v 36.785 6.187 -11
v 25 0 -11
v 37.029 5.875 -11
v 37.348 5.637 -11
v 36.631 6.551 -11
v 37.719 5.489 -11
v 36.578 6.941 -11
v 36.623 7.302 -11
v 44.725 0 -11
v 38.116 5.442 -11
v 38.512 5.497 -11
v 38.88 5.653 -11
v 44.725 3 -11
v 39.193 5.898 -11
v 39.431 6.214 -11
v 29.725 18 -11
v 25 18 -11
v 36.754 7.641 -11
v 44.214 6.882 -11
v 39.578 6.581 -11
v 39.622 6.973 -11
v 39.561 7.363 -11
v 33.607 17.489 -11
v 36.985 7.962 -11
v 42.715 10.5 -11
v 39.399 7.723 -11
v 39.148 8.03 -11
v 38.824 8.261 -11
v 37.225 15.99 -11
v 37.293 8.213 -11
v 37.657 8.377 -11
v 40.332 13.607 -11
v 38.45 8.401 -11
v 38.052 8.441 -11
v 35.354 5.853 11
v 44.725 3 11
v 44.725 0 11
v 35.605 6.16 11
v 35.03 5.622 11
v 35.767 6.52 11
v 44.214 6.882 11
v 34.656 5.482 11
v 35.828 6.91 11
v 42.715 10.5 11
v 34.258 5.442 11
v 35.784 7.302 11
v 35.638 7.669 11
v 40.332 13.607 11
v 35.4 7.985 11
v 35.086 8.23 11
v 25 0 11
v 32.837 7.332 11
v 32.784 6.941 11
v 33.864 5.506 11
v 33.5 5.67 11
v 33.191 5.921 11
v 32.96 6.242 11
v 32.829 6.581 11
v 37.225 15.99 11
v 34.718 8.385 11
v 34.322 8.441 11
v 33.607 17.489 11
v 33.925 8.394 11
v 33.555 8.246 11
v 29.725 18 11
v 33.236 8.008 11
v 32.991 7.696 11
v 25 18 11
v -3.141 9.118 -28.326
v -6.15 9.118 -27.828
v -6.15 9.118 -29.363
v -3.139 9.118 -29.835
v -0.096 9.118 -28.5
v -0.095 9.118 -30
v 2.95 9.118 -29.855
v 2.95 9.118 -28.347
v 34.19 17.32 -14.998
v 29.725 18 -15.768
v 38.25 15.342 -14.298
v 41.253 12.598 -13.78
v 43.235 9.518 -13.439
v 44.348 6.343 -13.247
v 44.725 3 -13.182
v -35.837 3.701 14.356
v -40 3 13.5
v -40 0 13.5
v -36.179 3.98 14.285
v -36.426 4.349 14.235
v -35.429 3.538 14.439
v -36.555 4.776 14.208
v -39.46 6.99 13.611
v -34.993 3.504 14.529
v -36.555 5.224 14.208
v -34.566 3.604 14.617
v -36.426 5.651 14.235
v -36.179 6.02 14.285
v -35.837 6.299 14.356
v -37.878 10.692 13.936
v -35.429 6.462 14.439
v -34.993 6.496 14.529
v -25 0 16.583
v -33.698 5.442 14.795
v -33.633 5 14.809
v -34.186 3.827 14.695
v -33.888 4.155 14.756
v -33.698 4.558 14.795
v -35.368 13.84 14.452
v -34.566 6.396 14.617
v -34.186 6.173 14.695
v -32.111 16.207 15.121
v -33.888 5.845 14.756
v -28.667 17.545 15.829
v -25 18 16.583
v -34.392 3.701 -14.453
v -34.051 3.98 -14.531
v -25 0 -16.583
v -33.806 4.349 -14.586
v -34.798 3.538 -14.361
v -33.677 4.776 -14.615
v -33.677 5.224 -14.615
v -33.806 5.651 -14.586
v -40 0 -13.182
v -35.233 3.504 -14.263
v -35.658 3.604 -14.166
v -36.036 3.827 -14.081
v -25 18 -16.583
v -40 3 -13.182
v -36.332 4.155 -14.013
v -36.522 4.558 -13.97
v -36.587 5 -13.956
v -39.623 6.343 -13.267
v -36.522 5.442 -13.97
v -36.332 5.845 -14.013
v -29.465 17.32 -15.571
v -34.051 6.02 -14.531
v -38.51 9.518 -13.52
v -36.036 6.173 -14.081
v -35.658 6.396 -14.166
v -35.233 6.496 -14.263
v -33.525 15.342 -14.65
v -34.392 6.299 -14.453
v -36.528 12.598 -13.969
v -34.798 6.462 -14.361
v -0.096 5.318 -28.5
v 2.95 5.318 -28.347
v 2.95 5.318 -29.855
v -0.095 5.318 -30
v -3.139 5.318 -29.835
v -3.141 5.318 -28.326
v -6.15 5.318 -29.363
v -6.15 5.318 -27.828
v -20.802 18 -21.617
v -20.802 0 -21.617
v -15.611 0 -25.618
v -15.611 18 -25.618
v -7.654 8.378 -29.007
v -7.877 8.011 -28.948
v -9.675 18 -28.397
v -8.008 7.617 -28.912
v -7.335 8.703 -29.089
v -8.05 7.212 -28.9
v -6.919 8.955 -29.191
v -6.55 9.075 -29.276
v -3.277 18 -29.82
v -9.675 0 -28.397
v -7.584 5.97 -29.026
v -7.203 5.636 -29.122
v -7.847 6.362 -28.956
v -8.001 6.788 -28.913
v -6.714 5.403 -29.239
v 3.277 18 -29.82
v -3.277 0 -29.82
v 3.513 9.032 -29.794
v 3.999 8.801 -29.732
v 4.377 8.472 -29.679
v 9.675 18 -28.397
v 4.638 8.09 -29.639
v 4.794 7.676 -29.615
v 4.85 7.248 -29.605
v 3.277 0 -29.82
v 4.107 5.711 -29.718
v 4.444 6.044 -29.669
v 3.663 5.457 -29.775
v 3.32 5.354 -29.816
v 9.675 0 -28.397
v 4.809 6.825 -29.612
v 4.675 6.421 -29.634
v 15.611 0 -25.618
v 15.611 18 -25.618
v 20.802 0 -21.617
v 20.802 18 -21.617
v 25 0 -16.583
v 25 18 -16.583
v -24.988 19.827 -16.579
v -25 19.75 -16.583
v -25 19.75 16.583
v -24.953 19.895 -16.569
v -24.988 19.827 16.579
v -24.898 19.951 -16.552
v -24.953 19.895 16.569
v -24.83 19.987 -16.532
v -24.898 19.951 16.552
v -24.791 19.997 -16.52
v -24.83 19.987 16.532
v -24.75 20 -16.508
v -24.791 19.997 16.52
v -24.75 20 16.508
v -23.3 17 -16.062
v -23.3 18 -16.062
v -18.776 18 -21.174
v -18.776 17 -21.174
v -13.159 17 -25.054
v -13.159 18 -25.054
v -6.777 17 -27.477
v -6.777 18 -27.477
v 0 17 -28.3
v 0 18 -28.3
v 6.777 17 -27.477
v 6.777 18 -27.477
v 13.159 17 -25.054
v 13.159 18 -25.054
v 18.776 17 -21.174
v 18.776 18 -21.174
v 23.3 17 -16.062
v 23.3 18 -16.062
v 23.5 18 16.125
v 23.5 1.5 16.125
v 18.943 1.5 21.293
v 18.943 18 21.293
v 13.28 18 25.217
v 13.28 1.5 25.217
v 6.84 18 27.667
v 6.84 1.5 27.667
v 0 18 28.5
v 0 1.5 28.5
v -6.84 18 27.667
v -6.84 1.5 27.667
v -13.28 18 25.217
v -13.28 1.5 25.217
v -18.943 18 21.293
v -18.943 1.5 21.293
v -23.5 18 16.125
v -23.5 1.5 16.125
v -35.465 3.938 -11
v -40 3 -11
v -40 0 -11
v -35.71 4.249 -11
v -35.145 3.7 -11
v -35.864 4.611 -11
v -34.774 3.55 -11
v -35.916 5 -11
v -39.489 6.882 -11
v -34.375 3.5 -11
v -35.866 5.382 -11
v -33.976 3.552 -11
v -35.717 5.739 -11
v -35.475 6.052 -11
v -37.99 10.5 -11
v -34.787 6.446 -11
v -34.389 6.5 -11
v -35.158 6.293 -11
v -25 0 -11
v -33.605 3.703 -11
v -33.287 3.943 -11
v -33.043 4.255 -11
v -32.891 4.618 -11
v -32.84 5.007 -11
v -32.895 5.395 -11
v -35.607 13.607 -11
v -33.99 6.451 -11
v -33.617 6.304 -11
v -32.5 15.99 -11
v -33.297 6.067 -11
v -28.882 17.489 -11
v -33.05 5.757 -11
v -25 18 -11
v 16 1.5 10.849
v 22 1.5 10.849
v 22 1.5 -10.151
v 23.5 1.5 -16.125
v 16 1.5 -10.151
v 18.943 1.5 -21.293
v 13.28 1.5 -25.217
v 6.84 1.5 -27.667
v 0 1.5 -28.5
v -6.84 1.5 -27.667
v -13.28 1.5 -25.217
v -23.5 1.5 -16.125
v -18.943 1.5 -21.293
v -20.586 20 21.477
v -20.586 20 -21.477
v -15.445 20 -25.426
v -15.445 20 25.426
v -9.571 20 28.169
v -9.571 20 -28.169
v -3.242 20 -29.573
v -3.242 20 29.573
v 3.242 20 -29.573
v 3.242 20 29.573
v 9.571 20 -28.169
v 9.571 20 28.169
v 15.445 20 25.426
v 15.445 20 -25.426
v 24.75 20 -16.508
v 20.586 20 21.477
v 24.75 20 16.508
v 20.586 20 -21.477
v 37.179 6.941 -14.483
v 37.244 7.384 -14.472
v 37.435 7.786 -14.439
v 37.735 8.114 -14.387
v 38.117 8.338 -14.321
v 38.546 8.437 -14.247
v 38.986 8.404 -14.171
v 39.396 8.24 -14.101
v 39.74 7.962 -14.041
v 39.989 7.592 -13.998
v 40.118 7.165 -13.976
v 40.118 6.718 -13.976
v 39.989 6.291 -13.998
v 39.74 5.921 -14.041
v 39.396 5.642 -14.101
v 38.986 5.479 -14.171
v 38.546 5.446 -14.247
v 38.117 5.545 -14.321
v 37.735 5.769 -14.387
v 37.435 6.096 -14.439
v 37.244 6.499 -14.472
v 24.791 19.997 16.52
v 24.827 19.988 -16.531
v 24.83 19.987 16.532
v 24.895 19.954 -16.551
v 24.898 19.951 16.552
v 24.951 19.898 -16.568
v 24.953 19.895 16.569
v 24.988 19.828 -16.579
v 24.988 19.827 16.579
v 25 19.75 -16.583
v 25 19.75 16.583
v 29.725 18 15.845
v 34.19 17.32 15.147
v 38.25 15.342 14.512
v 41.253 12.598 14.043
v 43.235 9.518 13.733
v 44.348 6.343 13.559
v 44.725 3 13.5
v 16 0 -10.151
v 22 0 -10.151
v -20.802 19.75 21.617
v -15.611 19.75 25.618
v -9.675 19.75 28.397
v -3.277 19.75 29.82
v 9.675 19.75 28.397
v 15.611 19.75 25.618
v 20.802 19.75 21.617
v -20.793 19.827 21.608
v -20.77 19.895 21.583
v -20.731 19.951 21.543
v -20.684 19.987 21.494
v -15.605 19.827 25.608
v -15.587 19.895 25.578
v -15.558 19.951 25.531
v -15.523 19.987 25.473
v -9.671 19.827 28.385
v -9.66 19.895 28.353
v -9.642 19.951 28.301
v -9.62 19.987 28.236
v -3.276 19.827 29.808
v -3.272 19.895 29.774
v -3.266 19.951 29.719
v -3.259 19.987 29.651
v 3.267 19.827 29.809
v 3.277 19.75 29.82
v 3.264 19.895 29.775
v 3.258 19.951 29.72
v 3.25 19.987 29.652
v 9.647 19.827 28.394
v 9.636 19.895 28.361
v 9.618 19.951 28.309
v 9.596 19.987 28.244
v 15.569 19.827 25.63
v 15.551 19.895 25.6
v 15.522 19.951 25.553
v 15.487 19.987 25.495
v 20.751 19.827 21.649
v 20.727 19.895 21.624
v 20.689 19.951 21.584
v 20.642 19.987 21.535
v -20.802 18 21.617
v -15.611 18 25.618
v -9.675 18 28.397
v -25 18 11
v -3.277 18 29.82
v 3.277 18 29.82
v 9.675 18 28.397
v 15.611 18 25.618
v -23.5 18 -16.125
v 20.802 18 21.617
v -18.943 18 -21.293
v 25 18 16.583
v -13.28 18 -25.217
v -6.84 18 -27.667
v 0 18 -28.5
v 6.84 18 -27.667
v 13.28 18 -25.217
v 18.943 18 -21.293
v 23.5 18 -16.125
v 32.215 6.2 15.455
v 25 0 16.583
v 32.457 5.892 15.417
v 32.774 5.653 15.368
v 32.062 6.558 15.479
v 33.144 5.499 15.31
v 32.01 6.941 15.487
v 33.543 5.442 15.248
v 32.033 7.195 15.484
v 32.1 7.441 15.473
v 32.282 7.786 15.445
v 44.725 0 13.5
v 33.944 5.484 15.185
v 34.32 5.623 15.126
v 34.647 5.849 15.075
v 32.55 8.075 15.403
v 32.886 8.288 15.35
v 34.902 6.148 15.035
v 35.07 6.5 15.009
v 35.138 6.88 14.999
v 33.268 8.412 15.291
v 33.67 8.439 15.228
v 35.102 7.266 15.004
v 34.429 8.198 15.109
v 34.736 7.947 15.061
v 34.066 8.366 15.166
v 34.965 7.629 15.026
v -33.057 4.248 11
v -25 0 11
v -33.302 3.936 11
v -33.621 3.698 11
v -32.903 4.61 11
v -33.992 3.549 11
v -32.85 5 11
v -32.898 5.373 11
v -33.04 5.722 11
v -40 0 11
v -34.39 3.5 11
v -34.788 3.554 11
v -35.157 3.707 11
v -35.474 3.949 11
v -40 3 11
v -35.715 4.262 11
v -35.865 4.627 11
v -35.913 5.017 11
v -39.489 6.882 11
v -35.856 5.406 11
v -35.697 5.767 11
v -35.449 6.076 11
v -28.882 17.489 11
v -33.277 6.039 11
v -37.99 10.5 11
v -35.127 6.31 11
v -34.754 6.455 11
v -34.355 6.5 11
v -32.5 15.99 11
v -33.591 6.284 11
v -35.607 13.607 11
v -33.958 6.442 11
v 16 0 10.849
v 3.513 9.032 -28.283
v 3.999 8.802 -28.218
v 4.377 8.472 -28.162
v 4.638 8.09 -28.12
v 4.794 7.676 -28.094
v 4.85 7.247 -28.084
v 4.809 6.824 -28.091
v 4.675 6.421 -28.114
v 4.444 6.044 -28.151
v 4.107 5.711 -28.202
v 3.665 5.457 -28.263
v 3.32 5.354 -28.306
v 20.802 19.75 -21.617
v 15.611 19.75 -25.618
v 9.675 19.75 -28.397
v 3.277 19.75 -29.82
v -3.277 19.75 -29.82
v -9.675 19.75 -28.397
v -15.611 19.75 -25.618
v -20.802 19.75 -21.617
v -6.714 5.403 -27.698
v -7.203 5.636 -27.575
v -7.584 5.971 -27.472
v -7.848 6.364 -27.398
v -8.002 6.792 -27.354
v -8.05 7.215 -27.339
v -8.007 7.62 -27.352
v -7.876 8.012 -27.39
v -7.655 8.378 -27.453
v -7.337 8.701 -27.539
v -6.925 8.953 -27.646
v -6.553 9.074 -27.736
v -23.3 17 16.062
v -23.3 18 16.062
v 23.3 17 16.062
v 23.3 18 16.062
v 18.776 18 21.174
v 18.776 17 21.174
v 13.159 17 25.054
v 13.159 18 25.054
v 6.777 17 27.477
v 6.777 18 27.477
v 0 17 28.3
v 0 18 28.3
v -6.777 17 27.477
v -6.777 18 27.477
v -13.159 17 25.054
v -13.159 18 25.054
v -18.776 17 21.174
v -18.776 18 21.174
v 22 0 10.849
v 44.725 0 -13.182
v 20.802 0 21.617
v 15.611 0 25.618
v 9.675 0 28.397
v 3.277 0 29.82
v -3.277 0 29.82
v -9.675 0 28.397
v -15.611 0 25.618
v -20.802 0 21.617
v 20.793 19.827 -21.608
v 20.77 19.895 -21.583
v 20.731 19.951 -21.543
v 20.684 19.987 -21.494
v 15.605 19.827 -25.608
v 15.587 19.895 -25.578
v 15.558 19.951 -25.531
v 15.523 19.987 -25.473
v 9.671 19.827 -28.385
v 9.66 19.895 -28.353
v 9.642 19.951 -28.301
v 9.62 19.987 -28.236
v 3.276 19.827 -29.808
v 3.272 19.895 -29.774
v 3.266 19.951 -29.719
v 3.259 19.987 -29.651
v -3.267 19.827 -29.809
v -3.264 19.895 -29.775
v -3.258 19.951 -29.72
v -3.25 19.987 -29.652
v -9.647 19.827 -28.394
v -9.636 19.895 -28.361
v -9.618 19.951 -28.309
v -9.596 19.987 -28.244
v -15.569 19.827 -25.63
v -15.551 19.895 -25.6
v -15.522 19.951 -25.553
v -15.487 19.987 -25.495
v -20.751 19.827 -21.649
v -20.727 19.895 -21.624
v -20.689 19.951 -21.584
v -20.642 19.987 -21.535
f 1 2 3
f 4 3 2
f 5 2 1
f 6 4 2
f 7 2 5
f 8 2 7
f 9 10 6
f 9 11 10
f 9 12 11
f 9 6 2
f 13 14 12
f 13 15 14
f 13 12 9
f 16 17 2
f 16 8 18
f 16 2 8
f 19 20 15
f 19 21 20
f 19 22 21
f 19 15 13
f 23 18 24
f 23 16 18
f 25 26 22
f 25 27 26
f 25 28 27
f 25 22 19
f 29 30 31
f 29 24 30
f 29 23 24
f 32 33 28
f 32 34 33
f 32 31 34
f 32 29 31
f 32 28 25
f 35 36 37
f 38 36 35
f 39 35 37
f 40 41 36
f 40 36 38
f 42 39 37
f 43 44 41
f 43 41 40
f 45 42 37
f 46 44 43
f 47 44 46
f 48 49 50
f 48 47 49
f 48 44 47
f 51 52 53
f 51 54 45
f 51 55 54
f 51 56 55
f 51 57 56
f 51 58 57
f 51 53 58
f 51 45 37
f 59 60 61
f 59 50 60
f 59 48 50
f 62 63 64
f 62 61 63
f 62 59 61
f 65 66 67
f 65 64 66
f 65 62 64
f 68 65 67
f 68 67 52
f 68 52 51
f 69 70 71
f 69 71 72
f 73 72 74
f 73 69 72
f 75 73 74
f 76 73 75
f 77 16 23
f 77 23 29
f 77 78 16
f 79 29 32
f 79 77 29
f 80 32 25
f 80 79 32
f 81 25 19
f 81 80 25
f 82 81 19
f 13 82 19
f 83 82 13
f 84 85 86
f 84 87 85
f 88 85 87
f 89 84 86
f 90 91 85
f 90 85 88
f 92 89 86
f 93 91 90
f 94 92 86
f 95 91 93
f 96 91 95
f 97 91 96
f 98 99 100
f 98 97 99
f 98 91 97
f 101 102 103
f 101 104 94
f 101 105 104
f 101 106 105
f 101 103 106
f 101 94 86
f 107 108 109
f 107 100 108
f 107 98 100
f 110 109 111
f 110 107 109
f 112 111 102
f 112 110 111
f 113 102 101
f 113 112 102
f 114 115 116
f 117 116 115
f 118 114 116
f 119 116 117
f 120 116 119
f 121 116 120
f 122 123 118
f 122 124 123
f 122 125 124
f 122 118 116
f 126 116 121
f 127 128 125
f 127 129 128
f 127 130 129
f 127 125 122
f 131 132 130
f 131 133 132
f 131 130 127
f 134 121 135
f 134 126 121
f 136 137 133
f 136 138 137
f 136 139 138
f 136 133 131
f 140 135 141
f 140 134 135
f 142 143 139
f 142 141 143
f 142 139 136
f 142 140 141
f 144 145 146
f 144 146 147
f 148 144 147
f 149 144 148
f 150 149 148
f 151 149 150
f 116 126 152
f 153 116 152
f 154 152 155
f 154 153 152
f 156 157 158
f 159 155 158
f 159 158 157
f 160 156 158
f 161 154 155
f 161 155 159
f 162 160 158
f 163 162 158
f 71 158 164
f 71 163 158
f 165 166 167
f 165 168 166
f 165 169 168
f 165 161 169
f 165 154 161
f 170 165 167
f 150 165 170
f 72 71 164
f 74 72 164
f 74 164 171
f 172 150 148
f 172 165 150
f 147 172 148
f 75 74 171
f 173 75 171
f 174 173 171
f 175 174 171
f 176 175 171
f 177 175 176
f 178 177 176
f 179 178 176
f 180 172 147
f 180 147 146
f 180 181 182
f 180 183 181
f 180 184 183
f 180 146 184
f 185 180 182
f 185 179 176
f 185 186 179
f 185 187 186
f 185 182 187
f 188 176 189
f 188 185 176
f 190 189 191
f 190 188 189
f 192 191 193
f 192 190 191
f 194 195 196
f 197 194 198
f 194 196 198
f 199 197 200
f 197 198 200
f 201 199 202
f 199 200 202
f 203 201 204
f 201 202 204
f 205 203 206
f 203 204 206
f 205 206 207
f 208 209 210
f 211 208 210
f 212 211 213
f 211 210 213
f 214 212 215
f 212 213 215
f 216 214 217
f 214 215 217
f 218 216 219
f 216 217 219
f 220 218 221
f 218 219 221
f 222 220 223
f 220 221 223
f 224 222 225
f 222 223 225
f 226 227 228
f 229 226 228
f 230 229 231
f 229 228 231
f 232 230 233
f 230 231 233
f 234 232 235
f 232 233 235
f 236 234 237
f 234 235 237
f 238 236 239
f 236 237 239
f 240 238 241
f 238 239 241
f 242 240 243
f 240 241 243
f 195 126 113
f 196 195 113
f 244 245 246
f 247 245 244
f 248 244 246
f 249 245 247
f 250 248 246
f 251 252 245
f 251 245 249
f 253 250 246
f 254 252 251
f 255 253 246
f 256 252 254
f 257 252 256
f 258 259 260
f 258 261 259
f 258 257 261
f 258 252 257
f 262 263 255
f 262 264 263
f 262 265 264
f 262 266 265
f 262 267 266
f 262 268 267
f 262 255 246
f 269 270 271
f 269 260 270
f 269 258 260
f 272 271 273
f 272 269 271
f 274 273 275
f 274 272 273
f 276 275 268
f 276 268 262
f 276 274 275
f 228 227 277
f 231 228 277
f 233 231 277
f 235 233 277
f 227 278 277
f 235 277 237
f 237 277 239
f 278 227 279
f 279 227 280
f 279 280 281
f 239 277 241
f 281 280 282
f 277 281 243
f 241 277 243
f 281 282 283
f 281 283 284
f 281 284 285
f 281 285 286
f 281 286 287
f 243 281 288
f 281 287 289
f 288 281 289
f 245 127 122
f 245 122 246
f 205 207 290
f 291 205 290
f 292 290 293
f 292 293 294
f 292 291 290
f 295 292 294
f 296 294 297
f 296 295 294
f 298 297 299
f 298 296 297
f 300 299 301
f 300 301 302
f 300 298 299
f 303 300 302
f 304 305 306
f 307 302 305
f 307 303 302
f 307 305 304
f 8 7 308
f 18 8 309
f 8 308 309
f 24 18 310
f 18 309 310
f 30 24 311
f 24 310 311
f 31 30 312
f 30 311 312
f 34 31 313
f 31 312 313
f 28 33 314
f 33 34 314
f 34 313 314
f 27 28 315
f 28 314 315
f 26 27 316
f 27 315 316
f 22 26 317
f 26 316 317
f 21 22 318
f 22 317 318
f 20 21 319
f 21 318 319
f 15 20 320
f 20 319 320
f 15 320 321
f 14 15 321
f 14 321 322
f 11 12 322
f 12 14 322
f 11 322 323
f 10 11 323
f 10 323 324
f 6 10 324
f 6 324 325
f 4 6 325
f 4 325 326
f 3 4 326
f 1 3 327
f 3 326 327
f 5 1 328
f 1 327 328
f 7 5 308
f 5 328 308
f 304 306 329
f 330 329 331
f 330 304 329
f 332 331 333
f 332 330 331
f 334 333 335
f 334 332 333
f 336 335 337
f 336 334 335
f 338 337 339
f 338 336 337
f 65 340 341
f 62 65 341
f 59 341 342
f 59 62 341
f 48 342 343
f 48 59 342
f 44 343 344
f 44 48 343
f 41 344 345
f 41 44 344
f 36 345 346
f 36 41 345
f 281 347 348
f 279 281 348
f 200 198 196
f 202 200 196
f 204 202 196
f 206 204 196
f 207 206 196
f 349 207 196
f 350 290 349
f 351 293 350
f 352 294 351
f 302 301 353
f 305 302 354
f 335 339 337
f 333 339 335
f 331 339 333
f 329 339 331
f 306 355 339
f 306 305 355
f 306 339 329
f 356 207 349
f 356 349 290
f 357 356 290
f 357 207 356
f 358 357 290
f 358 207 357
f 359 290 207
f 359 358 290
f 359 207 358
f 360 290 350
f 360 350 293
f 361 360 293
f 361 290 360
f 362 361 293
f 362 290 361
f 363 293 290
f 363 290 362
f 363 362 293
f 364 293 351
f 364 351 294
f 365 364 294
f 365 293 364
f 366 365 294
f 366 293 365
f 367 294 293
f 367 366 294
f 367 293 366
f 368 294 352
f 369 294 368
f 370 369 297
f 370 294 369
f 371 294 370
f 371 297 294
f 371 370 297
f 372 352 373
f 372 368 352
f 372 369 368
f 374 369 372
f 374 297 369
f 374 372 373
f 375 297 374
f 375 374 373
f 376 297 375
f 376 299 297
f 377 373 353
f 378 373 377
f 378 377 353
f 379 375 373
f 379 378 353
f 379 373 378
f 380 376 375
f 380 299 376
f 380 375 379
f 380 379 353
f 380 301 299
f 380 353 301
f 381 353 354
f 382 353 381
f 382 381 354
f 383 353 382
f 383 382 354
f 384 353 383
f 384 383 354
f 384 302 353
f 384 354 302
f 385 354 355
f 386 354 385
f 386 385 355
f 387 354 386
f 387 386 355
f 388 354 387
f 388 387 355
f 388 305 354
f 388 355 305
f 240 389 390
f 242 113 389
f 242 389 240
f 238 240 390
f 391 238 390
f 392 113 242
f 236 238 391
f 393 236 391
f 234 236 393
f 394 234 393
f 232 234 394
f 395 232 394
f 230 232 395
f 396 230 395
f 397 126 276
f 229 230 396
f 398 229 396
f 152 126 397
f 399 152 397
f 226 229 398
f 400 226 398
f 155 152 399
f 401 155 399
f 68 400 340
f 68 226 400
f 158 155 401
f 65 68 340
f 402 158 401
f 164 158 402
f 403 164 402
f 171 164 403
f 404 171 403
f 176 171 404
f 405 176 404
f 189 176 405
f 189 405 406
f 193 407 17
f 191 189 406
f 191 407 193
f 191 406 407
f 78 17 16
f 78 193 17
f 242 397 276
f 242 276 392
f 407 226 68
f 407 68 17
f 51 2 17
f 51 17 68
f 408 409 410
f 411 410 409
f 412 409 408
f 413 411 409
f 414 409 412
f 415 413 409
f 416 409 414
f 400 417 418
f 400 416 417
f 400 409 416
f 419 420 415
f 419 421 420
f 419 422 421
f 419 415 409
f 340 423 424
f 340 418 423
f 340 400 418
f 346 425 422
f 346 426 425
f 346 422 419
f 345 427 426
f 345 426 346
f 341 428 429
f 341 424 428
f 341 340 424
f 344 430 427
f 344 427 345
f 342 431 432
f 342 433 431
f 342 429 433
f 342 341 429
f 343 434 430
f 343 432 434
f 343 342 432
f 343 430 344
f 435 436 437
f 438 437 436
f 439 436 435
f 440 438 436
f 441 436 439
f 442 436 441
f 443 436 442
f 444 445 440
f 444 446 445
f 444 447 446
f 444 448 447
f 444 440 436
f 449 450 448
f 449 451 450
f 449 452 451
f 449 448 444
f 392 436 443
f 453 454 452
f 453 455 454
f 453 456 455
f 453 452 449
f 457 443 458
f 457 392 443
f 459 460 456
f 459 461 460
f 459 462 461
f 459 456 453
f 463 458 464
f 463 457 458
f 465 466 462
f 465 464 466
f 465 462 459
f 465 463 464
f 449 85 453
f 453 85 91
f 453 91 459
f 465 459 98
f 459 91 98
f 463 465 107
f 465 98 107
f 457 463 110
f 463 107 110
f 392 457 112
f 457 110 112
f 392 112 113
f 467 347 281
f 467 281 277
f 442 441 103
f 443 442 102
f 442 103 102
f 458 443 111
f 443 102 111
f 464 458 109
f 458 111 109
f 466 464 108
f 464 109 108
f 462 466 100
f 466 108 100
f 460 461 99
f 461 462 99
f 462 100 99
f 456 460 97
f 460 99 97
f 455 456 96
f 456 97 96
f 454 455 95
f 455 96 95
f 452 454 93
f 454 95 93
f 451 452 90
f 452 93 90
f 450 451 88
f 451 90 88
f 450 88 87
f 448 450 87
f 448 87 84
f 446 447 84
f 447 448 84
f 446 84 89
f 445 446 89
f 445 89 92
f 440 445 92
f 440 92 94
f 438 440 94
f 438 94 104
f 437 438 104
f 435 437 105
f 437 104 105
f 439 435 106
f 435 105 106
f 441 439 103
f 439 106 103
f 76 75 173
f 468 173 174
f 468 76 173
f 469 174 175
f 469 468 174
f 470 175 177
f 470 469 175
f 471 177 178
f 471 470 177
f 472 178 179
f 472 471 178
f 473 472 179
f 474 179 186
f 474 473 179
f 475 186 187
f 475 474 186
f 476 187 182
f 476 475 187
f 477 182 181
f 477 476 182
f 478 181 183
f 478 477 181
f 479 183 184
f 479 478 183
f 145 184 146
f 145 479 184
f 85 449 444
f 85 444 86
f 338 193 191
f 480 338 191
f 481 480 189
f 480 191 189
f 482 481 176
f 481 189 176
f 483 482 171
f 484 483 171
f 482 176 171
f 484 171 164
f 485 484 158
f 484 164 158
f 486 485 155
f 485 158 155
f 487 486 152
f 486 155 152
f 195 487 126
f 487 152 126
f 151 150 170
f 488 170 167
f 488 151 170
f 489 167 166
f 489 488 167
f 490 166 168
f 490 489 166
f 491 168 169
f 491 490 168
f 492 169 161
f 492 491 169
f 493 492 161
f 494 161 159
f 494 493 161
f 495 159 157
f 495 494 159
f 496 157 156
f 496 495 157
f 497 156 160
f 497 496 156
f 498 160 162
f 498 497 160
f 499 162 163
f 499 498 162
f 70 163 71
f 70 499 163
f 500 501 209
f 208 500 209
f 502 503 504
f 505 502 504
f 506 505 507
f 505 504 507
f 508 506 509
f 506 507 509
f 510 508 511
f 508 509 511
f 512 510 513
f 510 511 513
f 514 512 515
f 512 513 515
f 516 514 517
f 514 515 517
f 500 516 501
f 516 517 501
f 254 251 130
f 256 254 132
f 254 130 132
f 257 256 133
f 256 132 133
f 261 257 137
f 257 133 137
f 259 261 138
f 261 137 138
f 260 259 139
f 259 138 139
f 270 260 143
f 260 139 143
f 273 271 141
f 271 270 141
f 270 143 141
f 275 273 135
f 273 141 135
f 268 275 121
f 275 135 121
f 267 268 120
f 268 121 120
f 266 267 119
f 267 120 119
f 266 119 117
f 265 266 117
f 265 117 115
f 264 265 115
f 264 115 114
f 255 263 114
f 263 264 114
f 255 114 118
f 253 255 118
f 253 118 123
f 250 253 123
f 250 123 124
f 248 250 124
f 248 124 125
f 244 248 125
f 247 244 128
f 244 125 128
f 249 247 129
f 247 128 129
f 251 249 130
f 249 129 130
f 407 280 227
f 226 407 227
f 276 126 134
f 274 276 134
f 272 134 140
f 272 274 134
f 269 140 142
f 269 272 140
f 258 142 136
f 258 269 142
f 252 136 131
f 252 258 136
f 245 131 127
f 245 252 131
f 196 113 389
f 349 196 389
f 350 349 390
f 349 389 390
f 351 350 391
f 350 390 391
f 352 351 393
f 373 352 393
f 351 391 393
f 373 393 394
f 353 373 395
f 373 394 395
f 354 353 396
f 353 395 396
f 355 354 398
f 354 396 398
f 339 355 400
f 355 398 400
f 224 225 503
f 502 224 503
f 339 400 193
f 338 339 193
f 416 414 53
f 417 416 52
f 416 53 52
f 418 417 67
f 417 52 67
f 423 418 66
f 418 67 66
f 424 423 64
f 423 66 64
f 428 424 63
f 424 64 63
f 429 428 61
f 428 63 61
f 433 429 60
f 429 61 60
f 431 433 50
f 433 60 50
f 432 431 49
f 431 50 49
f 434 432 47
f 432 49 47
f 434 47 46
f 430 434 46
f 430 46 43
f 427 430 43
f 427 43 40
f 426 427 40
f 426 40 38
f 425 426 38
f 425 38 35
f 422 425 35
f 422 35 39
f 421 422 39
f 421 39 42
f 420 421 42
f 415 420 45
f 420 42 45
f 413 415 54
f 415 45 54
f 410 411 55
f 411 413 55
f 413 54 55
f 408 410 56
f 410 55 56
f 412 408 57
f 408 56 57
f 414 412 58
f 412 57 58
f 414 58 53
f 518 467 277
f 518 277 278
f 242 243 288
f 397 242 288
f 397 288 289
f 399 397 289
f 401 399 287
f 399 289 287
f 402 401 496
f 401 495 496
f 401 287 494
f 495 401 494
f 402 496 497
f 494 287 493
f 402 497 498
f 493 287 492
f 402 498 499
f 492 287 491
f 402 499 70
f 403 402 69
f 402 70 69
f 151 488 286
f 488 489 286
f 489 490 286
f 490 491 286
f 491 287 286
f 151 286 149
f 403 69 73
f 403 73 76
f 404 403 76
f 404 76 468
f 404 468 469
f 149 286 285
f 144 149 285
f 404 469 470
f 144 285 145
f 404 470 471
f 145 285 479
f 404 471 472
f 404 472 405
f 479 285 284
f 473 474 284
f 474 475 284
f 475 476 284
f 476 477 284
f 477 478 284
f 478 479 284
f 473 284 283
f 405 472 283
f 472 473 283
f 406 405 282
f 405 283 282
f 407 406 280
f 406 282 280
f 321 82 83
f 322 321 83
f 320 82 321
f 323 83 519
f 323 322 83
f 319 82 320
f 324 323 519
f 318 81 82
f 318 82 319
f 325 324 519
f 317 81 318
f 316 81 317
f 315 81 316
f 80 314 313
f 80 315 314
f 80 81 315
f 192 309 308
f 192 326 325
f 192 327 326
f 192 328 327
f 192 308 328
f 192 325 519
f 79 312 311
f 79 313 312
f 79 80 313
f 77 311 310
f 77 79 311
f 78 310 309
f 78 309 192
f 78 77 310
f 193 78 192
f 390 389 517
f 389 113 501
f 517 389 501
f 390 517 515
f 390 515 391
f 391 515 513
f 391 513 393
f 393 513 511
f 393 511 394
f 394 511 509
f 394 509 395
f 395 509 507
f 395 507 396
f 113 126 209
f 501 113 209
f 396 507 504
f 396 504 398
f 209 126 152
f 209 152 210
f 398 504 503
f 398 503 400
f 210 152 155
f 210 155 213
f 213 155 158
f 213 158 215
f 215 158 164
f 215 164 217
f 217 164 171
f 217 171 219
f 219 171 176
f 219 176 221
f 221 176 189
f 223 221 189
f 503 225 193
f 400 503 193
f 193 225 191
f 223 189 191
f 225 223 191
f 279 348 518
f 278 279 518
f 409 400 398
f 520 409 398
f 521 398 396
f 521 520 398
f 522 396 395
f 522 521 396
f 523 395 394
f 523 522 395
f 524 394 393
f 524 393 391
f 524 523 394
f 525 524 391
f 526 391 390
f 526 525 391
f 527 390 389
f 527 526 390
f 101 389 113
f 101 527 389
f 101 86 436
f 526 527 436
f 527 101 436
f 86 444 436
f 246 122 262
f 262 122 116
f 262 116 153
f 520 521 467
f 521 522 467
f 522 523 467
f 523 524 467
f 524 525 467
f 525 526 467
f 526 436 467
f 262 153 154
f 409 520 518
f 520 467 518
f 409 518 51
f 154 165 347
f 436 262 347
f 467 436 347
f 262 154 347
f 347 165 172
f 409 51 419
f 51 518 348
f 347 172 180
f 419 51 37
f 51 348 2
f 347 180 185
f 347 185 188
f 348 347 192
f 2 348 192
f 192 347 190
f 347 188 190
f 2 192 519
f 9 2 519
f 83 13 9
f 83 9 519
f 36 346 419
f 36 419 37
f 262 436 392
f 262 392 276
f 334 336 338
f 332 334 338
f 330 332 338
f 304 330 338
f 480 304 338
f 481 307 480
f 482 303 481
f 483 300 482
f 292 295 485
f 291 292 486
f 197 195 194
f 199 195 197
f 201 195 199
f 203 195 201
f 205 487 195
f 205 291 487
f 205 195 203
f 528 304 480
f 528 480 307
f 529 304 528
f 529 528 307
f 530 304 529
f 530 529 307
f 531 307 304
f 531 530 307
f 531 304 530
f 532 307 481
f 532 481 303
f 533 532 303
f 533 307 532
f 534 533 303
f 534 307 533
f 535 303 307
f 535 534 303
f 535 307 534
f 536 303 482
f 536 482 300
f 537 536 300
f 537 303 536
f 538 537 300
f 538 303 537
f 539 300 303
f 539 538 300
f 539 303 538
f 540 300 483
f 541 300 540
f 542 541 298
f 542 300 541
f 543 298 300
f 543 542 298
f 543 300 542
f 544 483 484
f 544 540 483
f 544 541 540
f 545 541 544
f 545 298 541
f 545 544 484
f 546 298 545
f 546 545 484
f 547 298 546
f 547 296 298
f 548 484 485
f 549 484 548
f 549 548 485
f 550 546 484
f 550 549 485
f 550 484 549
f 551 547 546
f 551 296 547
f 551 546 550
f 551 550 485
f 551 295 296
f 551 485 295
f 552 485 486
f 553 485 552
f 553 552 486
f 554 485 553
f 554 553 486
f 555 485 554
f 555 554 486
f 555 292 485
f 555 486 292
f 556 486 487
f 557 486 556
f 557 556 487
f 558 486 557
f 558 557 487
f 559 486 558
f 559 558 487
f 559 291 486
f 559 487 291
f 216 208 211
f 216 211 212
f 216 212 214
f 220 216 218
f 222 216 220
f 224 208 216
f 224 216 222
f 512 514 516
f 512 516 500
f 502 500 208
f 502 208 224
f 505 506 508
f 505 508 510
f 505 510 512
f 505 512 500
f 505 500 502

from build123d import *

# Parameters (mm, degrees)
BOSS_EXTRUDE2_DEPTH = 18
SHELL1_T            = -1.5
BOSS_EXTRUDE3_DEPTH = 2
BOSS_EXTRUDE4_DEPTH = 1
BOSS_EXTRUDE7_DEPTH = 18
FILLET7_R           = 0.25
CUT_EXTRUDE4_DEPTH  = 58.448499703
SKETCH10_R          = 1.5
CUT_EXTRUDE5_DEPTH  = 70.435814173
SKETCH11_R          = 1.5
CUT_EXTRUDE7_DEPTH  = 10
SKETCH12_R          = 1.5
CUT_EXTRUDE8_DEPTH  = 10
SKETCH13_W          = 6
SKETCH13_H          = 21
CUT_EXTRUDE10_DEPTH = 10
FILLET10_R          = 15


with BuildPart() as part:
    # Sketch1 → Boss-Extrude2 (new body)
    with BuildSketch(Plane(origin=(0, 0, 0), x_dir=(1, 0, 0), z_dir=(0, 1, 0))):
        with BuildLine():
            Line((25, 16.583123952), (25, -16.583123952))
            ThreePointArc((25, -16.583123952), (0, -30), (-25, -16.583123952))
            Line((-25, -16.583123952), (-25, 16.583123952))
            ThreePointArc((-25, 16.583123952), (0, 30), (25, 16.583123952))
        make_face()
    extrude(amount=BOSS_EXTRUDE2_DEPTH)

    # Shell1
    shell1_openings = [part.faces().sort_by_distance(p)[0] for p in [
        (0, 18, 0),
    ]]
    offset(amount=SHELL1_T, openings=shell1_openings, kind=Kind.INTERSECTION)

    # Sketch7 → Boss-Extrude7 (add)
    with BuildSketch(Plane(origin=(0, 18, 0), x_dir=(1, 0, 0), z_dir=(0, 1, 0))):
        Polygon((-40, -13.5), (-25, -16.583123952), (-25, -11), (-40, -11), align=None)
        Polygon((25, -16.583123952), (44.725050119, -13.5), (44.725050119, -11), (25, -11), align=None)
        Polygon((-40, 11), (-25, 11), (-25, 16.583123952), (-40, 13.181667077), align=None)
        Polygon((25, 11), (44.725050119, 11), (44.725050119, 13.181667077), (25, 16.583123952), align=None)
    extrude(amount=-BOSS_EXTRUDE7_DEPTH)

    # Sketch9 → Cut-Extrude4 (cut, through all)
    with BuildSketch(Plane.XY):
        with BuildLine():
            Line((2.949777262, 5.317581021), (-6.150222738, 5.317581021))
            ThreePointArc((-6.150222738, 5.317581021), (-8.050222738, 7.217581021), (-6.150222738, 9.117581021))
            Line((-6.150222738, 9.117581021), (2.949777262, 9.117581021))
            ThreePointArc((2.949777262, 9.117581021), (4.849777262, 7.217581021), (2.949777262, 5.317581021))
        make_face()
    extrude(amount=-CUT_EXTRUDE4_DEPTH, mode=Mode.SUBTRACT)

    # Sketch10 → Cut-Extrude5 (cut, through all)
    with BuildSketch(Plane(origin=(3.49902162, 0, -20.290828129), x_dir=(-0.9854552120358971, 0, -0.16993535556582978), z_dir=(0.1699353555658298, 0, -0.9854552120358973))):
        with Locations((-35.67665006, 6.941451302)):
            Circle(SKETCH10_R)
    extrude(amount=-CUT_EXTRUDE5_DEPTH, mode=Mode.SUBTRACT)

    # Sketch11 → Cut-Extrude7 (cut)
    with BuildSketch(Plane(origin=(-4.799213229, 0, -21.163930954), x_dir=(-0.975240004414675, 0, 0.22114912115869936), z_dir=(-0.22114912115869936, 0, -0.975240004414675))):
        with Locations((31.094486087, 5)):
            Circle(SKETCH11_R)
    extrude(amount=-CUT_EXTRUDE7_DEPTH, mode=Mode.SUBTRACT)

    # Sketch12 → Cut-Extrude8 (cut)
    with BuildSketch(Plane(origin=(-4.283729275, 0, 20.841179316), x_dir=(0.9795229156245254, 0, 0.20133270416509336), z_dir=(-0.20133270416509333, 0, 0.9795229156245253))):
        with Locations((-31.462925119, 5)):
            Circle(SKETCH12_R)
    extrude(amount=-CUT_EXTRUDE8_DEPTH, mode=Mode.SUBTRACT)

    # Sketch13 → Cut-Extrude10 (cut)
    with BuildSketch(Plane.XZ):
        with Locations((19, 0.348849939)):
            Rectangle(SKETCH13_W, SKETCH13_H)
    extrude(amount=-CUT_EXTRUDE10_DEPTH, mode=Mode.SUBTRACT)

    # Fillet10
    fillet10_edges = [part.edges().sort_by_distance(p)[0] for p in [
        (44.725050119, 18, -12.090833539),
        (44.725050119, 18, 12.25),
        (-40, 18, -12.090833539),
        (-40, 18, 12.25),
    ]]
    fillet(fillet10_edges, radius=FILLET10_R)


with BuildPart() as body_2:
    # Sketch2 → Boss-Extrude3 (new body)
    with BuildSketch(Plane(origin=(0, 18, 0), x_dir=(1, 0, 0), z_dir=(0, 1, 0))):
        with BuildLine():
            Line((-25, 16.583123952), (-25, -16.583123952))
            ThreePointArc((-25, -16.583123952), (0, -30), (25, -16.583123952))
            Line((25, -16.583123952), (25, 16.583123952))
            ThreePointArc((25, 16.583123952), (0, 30), (-25, 16.583123952))
        make_face()
    extrude(amount=BOSS_EXTRUDE3_DEPTH)

    # Sketch3 → Boss-Extrude4 (add)
    with BuildSketch(Plane.XZ.offset(-18)):
        with BuildLine():
            Line((23.3, -16.062378404), (23.3, 16.062378404))
            ThreePointArc((23.3, 16.062378404), (0, 28.3), (-23.3, 16.062378404))
            Line((-23.3, 16.062378404), (-23.3, -16.062378404))
            ThreePointArc((-23.3, -16.062378404), (0, -28.3), (23.3, -16.062378404))
        make_face()
    extrude(amount=BOSS_EXTRUDE4_DEPTH)

    # Fillet7
    fillet7_edges = [body_2.edges().sort_by_distance(p)[0] for p in [
        (0, 20, 30),
        (25, 20, 0),
        (0, 20, -30),
        (-25, 20, 0),
    ]]
    fillet(fillet7_edges, radius=FILLET7_R)


solid = Compound([part.part, body_2.part])
